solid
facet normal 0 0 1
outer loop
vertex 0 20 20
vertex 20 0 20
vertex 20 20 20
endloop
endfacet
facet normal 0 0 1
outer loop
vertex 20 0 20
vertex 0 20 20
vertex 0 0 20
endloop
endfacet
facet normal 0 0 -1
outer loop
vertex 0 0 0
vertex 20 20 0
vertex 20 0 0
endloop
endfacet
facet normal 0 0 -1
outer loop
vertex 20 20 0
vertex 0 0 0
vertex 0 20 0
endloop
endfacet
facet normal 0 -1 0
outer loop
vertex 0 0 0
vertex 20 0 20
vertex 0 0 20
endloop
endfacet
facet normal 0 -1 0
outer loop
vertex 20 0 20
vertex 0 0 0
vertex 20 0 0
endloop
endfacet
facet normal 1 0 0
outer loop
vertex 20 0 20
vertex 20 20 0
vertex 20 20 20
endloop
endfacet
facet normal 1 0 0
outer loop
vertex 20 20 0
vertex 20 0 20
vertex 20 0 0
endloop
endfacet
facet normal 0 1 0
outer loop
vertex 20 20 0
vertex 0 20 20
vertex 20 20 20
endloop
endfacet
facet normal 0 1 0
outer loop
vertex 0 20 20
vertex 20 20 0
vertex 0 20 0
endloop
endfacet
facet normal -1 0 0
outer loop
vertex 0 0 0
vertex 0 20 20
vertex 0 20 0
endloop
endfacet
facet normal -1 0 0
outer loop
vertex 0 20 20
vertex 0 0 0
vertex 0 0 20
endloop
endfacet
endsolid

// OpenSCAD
// Failure class 11: compiles cleanly but is geometrically wrong
// This fixture is syntactically valid OpenSCAD and will compile and
// render successfully. However, the geometry does not match the
// reference photo or the stated dimensions. Only the vision loop
// (bounding-box gate + vision critique) can catch this class.
// The shape is a valid cube but with wrong proportions.
cube([20, 20, 20]);
